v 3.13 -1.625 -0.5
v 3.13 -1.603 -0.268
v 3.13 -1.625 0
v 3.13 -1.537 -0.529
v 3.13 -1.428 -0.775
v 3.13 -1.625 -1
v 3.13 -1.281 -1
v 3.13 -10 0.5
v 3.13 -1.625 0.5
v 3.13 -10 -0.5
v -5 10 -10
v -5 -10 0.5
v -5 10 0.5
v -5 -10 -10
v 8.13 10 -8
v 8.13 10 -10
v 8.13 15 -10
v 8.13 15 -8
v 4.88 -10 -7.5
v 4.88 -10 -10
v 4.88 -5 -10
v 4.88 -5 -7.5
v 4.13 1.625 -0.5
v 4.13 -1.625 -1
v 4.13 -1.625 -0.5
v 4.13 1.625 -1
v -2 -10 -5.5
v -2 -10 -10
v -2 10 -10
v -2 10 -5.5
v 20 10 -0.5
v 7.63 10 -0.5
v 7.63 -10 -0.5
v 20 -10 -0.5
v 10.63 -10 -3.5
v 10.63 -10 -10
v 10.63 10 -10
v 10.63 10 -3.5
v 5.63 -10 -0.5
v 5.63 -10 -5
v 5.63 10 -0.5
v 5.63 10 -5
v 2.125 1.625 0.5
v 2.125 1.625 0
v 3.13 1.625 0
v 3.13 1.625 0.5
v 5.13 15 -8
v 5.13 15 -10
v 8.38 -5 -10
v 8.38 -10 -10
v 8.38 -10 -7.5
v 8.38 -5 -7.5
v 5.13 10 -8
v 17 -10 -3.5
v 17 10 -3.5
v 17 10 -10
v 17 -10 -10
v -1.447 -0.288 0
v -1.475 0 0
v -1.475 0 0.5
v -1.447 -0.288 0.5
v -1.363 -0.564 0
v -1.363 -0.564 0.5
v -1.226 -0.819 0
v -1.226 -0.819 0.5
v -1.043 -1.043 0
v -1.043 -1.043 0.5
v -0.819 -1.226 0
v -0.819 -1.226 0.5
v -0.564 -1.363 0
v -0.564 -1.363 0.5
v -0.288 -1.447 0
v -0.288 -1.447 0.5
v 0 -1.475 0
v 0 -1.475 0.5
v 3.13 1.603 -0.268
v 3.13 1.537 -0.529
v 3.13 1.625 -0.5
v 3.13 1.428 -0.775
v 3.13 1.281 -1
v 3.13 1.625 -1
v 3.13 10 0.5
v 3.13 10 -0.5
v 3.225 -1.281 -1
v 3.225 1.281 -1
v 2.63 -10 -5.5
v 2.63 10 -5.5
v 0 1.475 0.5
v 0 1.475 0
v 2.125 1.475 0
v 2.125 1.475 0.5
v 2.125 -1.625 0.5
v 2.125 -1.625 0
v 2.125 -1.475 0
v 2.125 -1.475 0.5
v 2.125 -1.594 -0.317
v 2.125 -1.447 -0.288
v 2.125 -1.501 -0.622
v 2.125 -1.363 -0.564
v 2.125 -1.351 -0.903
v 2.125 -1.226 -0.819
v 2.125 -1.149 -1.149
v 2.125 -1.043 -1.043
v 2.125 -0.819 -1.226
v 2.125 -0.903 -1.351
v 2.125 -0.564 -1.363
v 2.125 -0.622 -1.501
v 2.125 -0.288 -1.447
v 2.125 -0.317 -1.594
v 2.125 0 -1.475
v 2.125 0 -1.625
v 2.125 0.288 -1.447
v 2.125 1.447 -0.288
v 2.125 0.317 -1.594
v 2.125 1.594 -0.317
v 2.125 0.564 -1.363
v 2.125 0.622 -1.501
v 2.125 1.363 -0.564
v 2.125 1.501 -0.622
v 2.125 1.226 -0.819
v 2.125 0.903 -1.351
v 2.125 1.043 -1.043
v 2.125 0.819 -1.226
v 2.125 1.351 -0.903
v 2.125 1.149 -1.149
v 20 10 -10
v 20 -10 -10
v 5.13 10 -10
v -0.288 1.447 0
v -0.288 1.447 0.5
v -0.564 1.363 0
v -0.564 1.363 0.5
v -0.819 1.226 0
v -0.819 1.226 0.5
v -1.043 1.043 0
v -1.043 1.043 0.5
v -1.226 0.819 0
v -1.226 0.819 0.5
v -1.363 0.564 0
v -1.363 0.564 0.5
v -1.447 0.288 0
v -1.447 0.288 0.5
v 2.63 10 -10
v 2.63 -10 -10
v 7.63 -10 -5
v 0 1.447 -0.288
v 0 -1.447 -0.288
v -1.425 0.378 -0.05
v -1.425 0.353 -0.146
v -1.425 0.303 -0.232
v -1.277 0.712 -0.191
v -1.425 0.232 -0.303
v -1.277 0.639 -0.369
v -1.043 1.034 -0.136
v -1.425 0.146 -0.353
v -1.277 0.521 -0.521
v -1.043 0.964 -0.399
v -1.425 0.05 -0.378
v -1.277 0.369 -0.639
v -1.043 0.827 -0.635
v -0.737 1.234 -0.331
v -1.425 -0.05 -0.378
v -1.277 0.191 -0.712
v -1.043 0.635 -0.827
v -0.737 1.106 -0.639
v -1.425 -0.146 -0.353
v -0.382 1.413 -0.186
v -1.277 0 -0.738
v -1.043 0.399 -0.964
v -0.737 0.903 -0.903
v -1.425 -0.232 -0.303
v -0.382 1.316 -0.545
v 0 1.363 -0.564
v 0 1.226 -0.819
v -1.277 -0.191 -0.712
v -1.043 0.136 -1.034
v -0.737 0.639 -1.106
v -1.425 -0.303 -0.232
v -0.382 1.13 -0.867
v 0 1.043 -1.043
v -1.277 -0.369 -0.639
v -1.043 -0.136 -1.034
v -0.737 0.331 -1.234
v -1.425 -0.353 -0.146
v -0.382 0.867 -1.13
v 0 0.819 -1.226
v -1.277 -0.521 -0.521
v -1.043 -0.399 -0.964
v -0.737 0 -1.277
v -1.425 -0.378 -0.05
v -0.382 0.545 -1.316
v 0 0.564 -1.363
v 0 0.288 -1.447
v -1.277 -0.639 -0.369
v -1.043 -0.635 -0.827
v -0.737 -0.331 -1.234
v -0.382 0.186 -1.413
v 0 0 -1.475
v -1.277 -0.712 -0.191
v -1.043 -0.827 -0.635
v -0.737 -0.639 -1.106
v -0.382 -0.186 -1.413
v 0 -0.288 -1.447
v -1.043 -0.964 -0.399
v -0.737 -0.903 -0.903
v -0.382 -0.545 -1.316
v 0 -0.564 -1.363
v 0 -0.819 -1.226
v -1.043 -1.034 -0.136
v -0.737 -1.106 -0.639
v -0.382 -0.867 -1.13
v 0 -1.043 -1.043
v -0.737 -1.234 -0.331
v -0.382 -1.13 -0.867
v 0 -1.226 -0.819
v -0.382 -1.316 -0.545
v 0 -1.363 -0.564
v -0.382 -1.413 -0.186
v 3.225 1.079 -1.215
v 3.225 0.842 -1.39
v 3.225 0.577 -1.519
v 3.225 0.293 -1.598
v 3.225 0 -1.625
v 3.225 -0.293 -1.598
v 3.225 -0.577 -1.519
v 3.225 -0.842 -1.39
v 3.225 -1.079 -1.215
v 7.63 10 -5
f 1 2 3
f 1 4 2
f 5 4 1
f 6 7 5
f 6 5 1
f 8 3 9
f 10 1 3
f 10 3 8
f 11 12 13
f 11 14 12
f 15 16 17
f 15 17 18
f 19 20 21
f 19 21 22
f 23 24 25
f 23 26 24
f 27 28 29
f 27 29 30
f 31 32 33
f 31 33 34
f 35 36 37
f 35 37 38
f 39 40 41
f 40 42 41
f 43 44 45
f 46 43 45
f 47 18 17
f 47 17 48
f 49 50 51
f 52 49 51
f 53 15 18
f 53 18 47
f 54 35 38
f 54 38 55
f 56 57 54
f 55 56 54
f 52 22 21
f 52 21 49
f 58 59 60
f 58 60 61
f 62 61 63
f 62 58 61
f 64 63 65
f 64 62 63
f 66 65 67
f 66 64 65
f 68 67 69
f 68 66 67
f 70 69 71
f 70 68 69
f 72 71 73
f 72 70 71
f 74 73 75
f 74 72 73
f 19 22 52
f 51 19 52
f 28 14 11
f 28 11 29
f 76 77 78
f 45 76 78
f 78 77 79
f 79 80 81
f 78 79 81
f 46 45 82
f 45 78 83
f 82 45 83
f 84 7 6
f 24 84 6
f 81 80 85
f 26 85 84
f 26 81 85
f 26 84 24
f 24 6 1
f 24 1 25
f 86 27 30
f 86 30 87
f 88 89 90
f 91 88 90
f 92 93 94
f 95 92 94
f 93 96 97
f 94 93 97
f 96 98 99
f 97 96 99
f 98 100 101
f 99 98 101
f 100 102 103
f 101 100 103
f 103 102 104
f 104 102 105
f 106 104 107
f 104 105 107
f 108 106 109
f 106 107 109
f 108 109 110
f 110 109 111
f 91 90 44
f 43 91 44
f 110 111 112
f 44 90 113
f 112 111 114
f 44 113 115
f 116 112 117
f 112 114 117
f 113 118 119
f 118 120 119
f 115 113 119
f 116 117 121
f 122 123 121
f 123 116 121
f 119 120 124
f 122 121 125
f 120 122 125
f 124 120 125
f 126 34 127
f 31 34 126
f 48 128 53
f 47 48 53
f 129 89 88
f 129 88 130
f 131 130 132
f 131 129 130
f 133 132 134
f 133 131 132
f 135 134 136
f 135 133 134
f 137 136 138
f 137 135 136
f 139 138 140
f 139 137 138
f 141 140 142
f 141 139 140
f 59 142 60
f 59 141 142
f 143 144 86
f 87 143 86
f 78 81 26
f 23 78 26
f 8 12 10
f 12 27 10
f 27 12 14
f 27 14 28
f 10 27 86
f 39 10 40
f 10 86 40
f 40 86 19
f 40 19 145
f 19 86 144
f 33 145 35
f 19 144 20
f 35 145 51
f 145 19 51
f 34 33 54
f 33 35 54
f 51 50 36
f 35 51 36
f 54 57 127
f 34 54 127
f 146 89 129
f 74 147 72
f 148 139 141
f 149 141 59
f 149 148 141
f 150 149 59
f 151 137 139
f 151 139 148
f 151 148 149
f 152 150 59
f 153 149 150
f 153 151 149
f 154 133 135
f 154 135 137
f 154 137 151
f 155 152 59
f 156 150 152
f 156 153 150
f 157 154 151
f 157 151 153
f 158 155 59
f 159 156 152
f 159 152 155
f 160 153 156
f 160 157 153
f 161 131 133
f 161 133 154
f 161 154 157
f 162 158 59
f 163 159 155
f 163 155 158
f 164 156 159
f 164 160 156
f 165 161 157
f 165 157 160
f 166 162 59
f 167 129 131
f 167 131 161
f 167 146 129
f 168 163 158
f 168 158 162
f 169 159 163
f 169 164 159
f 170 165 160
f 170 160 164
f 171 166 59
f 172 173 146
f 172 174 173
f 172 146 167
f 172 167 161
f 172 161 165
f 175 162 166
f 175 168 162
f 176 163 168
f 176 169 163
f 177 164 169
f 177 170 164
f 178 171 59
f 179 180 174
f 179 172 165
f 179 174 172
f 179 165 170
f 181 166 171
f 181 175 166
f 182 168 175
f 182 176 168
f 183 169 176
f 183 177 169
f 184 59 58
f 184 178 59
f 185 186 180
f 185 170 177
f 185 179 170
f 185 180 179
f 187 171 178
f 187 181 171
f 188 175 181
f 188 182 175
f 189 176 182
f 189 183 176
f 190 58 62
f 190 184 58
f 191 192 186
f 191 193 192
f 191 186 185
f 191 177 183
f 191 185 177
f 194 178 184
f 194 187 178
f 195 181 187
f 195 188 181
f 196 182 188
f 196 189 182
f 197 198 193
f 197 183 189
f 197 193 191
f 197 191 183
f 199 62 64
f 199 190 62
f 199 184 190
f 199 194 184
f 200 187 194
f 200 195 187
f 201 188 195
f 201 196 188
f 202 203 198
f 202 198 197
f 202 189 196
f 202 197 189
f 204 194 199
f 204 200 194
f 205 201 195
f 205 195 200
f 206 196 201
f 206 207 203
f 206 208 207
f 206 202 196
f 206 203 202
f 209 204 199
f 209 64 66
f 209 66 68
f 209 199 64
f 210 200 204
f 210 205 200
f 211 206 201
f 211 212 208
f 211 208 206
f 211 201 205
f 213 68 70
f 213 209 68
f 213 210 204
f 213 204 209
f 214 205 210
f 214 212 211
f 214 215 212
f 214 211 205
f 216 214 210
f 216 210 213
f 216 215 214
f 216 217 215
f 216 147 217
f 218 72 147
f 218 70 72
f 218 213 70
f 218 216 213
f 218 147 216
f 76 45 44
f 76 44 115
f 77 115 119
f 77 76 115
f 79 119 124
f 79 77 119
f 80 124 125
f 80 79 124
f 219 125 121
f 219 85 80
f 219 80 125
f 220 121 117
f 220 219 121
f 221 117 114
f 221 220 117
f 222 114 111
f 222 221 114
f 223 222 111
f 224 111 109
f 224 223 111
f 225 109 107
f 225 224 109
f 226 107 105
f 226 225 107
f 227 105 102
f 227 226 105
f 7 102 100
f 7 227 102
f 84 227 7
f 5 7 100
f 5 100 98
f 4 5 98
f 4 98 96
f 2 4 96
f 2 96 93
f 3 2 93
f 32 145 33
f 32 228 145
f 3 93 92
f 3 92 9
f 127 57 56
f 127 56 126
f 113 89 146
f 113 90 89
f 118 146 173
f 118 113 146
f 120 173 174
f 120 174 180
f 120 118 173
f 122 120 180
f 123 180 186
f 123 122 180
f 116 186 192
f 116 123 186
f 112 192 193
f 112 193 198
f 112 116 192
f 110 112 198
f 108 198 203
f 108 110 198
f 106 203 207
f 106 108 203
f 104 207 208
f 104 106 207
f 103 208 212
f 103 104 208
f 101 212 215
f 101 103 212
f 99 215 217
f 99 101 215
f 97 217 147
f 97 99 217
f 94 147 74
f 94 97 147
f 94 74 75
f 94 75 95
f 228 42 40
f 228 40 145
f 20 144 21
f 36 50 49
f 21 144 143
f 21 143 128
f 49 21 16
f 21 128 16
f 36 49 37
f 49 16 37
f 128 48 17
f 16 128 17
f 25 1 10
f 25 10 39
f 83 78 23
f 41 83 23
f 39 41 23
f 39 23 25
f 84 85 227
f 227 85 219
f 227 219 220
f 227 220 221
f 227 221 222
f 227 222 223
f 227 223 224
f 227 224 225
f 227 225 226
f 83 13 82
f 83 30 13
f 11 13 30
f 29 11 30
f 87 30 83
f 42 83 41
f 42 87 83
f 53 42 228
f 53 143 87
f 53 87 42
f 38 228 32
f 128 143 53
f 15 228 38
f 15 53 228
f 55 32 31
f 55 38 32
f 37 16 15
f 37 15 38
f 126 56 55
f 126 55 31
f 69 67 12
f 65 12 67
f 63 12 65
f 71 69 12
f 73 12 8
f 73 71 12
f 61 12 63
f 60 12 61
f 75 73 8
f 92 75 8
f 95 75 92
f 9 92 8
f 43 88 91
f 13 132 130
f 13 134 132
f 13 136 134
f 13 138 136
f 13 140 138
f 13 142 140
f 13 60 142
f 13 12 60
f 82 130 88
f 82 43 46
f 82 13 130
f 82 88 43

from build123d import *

# Parameters (mm, degrees)
F0_W          = 25
F0_H          = 20
F1_DEPTH      = 10
F4_W          = 2
F4_H          = 5
F4_W_2        = 1
F4_H_2        = 1
F5_DEPTH      = 25
F5_DEPTH_BACK = 25
F6_DEPTH      = 0.5
F7_DEPTH      = 0.5
F8_W          = 4.63
F8_H          = 4.5
F8_W_2        = 6.37
F8_H_2        = 6.5
F9_DEPTH      = 25
F10_W         = 1
F10_H         = 8.375
F11_DEPTH     = 0.5
F12_W         = 3.5
F12_H         = 2.5
F13_DEPTH     = 5
F14_W         = 3
F14_H         = 2
F15_DEPTH     = 5


with BuildPart() as f1:
    # F0 (on Top) → F1 (new body)
    with BuildSketch(Plane.XY):
        with Locations((7.5, 0)):
            Rectangle(F0_W, F0_H)
    extrude(amount=-F1_DEPTH)

    # F2 (on Top) → F3 (revolve, cut)
    with BuildSketch(Plane.XY):
        with BuildLine():
            Line((3.225, 0), (-1.475, 0))
            ThreePointArc((-1.475, 0), (-1.0429825023, -1.0429825023), (0, -1.475))
            Line((0, -1.475), (2.125, -1.475))
            Line((2.125, -1.475), (2.125, -1.625))
            Line((2.125, -1.625), (3.225, -1.625))
            Line((3.225, -1.625), (3.225, 0))
        make_face()
    revolve(axis=Axis((-2.855158034, 0, 0), (-1, 0, 0)), mode=Mode.SUBTRACT)

    # F4 (on Front) → F5 (cut, two sides)
    with BuildSketch(Plane.XZ) as f5_sk:
        with Locations((6.63, -2.5)):
            Rectangle(F4_W, F4_H)
        with Locations((3.63, -0.5)):
            Rectangle(F4_W_2, F4_H_2)
    extrude(amount=-F5_DEPTH, mode=Mode.SUBTRACT)
    extrude(f5_sk.sketch, amount=F5_DEPTH_BACK, mode=Mode.SUBTRACT)

    # F6 (cut): faces of the model
    f6_faces = [f1.faces().sort_by_distance(p)[0] for p in [
        (4.88, 0, 0),
        (13.815, 0, 0),
    ]]
    extrude(f6_faces, amount=-F6_DEPTH, mode=Mode.SUBTRACT)

    # F7 (add): a face of the model
    f7_faces = [f1.faces().sort_by_distance(p)[0] for p in [
        (2.9141072257, 5.8125, 0),
    ]]
    extrude(f7_faces, amount=F7_DEPTH)

    # F8 (on face) → F9 (cut)
    with BuildSketch(Plane.XZ.offset(10)):
        with Locations((0.315, -7.75)):
            Rectangle(F8_W, F8_H)
        with Locations((13.815, -6.75)):
            Rectangle(F8_W_2, F8_H_2)
    extrude(amount=-F9_DEPTH, mode=Mode.SUBTRACT)

    # F10 (on face) → F11 (join)
    with BuildSketch(Plane.XY.offset(-1)):
        with Locations((3.63, -5.8125)):
            Rectangle(F10_W, F10_H)
        with Locations((3.63, 5.8125)):
            Rectangle(F10_W, F10_H)
    extrude(amount=F11_DEPTH)

    # F12 (on face) → F13 (cut)
    with BuildSketch(Plane.XZ.offset(10)):
        with Locations((6.63, -8.75)):
            Rectangle(F12_W, F12_H)
    extrude(amount=-F13_DEPTH, mode=Mode.SUBTRACT)

    # F14 (on face) → F15 (join)
    with BuildSketch(Plane(origin=(0, 10, 0), x_dir=(-1, 0, 0), z_dir=(0, 1, 0))):
        with Locations((-6.63, -9)):
            Rectangle(F14_W, F14_H)
    extrude(amount=F15_DEPTH)


solid = f1.part
